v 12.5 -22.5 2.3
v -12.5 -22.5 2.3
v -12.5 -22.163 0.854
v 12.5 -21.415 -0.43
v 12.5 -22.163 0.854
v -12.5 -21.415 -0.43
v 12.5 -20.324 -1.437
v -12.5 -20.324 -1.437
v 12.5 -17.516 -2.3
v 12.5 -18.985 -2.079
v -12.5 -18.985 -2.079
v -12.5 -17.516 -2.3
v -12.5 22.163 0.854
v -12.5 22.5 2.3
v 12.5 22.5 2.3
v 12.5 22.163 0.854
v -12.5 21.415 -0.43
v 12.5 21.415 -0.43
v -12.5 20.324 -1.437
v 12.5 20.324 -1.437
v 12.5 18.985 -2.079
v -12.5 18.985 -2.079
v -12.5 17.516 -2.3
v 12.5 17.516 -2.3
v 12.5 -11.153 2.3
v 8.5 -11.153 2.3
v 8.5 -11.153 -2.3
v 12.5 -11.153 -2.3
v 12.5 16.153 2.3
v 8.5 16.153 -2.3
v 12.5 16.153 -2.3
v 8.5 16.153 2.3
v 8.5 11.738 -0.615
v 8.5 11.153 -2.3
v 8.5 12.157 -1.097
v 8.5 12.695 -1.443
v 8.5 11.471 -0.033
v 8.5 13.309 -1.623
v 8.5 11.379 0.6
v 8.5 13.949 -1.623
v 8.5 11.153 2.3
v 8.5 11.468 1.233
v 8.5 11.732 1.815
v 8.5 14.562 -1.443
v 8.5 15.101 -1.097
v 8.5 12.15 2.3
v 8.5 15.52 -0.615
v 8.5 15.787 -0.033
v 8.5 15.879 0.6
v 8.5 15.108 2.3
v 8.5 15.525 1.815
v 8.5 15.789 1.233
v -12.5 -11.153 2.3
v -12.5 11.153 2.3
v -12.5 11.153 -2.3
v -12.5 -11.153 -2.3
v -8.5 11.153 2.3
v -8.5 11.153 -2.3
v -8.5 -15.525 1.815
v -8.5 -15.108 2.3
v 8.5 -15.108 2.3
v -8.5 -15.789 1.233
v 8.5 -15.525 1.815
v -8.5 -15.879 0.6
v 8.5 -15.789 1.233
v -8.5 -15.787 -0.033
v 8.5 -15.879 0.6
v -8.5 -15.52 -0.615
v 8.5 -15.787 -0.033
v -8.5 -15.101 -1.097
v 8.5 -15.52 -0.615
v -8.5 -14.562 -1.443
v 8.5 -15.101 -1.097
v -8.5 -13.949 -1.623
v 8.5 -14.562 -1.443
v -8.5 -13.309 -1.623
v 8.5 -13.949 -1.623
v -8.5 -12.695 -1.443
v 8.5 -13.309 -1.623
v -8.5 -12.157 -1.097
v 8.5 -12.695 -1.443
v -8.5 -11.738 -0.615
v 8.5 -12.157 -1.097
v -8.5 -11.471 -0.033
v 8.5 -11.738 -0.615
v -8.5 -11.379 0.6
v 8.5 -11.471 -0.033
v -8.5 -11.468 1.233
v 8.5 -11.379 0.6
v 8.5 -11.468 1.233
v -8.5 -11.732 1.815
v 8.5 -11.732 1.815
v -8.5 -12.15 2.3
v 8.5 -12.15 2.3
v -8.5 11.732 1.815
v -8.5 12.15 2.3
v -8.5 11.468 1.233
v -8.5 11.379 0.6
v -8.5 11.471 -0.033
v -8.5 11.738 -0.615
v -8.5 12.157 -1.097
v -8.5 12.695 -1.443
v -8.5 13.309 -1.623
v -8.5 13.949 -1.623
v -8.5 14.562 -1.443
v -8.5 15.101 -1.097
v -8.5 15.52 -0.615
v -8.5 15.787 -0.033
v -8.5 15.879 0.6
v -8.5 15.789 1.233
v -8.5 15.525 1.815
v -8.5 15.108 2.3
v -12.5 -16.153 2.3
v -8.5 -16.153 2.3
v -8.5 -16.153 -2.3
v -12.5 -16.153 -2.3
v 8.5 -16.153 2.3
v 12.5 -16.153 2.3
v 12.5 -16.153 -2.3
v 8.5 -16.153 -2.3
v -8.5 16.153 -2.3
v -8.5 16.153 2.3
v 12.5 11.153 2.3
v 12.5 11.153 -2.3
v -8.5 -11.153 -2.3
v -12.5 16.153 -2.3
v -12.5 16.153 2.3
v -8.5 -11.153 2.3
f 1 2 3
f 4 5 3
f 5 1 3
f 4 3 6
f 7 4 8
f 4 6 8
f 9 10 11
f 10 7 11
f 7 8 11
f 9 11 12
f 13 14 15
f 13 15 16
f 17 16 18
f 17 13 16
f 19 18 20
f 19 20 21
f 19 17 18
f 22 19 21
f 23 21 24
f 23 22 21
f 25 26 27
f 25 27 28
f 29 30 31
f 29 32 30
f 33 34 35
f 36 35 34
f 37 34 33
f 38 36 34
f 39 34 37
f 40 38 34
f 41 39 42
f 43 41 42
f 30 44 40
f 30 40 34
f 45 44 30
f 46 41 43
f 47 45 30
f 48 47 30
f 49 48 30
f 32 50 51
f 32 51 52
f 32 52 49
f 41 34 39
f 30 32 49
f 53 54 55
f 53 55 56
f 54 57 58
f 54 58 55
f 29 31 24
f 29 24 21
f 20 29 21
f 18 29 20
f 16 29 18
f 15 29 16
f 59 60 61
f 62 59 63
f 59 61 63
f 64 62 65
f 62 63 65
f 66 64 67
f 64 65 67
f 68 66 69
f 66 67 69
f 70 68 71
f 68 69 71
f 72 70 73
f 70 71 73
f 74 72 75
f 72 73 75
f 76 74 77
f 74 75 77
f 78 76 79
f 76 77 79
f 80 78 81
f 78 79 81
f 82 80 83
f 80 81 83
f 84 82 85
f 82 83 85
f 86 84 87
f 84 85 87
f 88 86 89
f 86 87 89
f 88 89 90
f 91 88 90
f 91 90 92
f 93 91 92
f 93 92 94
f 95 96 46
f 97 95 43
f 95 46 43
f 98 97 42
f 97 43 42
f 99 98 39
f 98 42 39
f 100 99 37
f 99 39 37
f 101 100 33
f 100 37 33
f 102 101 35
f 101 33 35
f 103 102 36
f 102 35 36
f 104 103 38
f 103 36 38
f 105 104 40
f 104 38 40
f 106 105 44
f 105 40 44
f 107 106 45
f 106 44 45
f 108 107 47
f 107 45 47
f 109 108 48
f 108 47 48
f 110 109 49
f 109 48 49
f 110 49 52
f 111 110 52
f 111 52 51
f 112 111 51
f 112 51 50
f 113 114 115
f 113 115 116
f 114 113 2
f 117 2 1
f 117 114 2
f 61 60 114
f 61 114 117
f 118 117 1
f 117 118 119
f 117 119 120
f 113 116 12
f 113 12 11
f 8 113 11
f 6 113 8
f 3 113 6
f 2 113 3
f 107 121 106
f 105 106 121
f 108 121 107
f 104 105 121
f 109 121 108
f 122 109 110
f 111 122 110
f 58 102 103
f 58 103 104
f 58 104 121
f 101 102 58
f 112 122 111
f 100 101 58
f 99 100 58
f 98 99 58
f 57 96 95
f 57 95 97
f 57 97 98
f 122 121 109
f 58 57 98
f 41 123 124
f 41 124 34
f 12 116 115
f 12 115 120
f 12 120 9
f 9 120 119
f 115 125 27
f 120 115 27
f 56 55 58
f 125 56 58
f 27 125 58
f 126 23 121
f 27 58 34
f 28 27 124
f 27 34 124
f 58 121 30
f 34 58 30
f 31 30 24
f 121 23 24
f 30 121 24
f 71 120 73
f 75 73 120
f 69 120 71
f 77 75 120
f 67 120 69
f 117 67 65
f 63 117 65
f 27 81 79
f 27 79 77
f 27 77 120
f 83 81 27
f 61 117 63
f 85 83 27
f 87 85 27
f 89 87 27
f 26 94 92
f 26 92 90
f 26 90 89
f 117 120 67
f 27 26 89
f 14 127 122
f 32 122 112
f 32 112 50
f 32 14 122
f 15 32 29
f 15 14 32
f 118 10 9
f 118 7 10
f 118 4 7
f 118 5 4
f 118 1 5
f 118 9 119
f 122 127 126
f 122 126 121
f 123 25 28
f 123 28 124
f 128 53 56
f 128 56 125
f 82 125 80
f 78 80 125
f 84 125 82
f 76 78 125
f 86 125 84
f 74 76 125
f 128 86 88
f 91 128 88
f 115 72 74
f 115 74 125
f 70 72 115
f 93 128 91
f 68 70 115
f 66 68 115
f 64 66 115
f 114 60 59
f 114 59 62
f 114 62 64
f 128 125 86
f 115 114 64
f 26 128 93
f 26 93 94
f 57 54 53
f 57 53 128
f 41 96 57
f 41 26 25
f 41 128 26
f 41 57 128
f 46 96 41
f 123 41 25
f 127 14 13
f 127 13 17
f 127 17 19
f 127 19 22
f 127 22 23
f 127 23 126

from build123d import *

# Parameters (mm, degrees)
F1_DEPTH    = 2.3
F2_R        = 2.25
F3_DEPTH    = 25
F4_T1_DEPTH = 49.9198715888


# Not quite as in the source:
# - a fillet or chamfer that OpenCascade refuses, or shapes differently, is made with other operations: its cross-section is extruded or revolved along the edge and cut away or added


with BuildPart() as f1:
    # F0 (on Top) → F1 (new body, symmetric)
    with BuildSketch(Plane.XY):
        Polygon((12.5, 22.5), (-12.5, 22.5), (-12.5, 16.1530176364), (-8.5, 16.1530176364), (-8.5, 11.1530176364), (-12.5, 11.1530176364), (-12.5, -11.1530176364), (-8.5, -11.1530176364), (-8.5, -16.1530176364), (-12.5, -16.1530176364), (-12.5, -22.5), (12.5, -22.5), (12.5, -16.1530176364), (8.5, -16.1530176364), (8.5, -11.1530176364), (12.5, -11.1530176364), (12.5, 11.1530176364), (8.5, 11.1530176364), (8.5, 16.1530176364), (12.5, 16.1530176364), align=None)
    extrude(amount=F1_DEPTH, both=True)

    # F2 (on face) → F3 (cut)
    with BuildSketch(Plane.YZ.offset(8.5)):
        with Locations((-13.6288348585, 0.6045123446)):
            Circle(F2_R)
        with Locations((13.6288348585, 0.6045123446)):
            Circle(F2_R)
    extrude(amount=-F3_DEPTH, mode=Mode.SUBTRACT)

    # F4: fillet of radius 5 on 2 edges, made by hand

    # F4_s2 → F4_t1 (cut)
    with BuildSketch(Plane.YZ.offset(-24.9599357944)):
        with BuildLine():
            ThreePointArc((-22.5, 2.3), (-20.9071906738, -0.9742346142), (-17.5160256822, -2.3))
            Line((-17.5160256822, -2.3), (-22.5, -2.3))
            Line((-22.5, -2.3), (-22.5, 2.3))
        make_face()
        with BuildLine():
            ThreePointArc((22.5, 2.3), (20.9071906738, -0.9742346142), (17.5160256822, -2.3))
            Line((17.5160256822, -2.3), (22.5, -2.3))
            Line((22.5, -2.3), (22.5, 2.3))
        make_face()
    extrude(amount=F4_T1_DEPTH, mode=Mode.SUBTRACT)


solid = f1.part
